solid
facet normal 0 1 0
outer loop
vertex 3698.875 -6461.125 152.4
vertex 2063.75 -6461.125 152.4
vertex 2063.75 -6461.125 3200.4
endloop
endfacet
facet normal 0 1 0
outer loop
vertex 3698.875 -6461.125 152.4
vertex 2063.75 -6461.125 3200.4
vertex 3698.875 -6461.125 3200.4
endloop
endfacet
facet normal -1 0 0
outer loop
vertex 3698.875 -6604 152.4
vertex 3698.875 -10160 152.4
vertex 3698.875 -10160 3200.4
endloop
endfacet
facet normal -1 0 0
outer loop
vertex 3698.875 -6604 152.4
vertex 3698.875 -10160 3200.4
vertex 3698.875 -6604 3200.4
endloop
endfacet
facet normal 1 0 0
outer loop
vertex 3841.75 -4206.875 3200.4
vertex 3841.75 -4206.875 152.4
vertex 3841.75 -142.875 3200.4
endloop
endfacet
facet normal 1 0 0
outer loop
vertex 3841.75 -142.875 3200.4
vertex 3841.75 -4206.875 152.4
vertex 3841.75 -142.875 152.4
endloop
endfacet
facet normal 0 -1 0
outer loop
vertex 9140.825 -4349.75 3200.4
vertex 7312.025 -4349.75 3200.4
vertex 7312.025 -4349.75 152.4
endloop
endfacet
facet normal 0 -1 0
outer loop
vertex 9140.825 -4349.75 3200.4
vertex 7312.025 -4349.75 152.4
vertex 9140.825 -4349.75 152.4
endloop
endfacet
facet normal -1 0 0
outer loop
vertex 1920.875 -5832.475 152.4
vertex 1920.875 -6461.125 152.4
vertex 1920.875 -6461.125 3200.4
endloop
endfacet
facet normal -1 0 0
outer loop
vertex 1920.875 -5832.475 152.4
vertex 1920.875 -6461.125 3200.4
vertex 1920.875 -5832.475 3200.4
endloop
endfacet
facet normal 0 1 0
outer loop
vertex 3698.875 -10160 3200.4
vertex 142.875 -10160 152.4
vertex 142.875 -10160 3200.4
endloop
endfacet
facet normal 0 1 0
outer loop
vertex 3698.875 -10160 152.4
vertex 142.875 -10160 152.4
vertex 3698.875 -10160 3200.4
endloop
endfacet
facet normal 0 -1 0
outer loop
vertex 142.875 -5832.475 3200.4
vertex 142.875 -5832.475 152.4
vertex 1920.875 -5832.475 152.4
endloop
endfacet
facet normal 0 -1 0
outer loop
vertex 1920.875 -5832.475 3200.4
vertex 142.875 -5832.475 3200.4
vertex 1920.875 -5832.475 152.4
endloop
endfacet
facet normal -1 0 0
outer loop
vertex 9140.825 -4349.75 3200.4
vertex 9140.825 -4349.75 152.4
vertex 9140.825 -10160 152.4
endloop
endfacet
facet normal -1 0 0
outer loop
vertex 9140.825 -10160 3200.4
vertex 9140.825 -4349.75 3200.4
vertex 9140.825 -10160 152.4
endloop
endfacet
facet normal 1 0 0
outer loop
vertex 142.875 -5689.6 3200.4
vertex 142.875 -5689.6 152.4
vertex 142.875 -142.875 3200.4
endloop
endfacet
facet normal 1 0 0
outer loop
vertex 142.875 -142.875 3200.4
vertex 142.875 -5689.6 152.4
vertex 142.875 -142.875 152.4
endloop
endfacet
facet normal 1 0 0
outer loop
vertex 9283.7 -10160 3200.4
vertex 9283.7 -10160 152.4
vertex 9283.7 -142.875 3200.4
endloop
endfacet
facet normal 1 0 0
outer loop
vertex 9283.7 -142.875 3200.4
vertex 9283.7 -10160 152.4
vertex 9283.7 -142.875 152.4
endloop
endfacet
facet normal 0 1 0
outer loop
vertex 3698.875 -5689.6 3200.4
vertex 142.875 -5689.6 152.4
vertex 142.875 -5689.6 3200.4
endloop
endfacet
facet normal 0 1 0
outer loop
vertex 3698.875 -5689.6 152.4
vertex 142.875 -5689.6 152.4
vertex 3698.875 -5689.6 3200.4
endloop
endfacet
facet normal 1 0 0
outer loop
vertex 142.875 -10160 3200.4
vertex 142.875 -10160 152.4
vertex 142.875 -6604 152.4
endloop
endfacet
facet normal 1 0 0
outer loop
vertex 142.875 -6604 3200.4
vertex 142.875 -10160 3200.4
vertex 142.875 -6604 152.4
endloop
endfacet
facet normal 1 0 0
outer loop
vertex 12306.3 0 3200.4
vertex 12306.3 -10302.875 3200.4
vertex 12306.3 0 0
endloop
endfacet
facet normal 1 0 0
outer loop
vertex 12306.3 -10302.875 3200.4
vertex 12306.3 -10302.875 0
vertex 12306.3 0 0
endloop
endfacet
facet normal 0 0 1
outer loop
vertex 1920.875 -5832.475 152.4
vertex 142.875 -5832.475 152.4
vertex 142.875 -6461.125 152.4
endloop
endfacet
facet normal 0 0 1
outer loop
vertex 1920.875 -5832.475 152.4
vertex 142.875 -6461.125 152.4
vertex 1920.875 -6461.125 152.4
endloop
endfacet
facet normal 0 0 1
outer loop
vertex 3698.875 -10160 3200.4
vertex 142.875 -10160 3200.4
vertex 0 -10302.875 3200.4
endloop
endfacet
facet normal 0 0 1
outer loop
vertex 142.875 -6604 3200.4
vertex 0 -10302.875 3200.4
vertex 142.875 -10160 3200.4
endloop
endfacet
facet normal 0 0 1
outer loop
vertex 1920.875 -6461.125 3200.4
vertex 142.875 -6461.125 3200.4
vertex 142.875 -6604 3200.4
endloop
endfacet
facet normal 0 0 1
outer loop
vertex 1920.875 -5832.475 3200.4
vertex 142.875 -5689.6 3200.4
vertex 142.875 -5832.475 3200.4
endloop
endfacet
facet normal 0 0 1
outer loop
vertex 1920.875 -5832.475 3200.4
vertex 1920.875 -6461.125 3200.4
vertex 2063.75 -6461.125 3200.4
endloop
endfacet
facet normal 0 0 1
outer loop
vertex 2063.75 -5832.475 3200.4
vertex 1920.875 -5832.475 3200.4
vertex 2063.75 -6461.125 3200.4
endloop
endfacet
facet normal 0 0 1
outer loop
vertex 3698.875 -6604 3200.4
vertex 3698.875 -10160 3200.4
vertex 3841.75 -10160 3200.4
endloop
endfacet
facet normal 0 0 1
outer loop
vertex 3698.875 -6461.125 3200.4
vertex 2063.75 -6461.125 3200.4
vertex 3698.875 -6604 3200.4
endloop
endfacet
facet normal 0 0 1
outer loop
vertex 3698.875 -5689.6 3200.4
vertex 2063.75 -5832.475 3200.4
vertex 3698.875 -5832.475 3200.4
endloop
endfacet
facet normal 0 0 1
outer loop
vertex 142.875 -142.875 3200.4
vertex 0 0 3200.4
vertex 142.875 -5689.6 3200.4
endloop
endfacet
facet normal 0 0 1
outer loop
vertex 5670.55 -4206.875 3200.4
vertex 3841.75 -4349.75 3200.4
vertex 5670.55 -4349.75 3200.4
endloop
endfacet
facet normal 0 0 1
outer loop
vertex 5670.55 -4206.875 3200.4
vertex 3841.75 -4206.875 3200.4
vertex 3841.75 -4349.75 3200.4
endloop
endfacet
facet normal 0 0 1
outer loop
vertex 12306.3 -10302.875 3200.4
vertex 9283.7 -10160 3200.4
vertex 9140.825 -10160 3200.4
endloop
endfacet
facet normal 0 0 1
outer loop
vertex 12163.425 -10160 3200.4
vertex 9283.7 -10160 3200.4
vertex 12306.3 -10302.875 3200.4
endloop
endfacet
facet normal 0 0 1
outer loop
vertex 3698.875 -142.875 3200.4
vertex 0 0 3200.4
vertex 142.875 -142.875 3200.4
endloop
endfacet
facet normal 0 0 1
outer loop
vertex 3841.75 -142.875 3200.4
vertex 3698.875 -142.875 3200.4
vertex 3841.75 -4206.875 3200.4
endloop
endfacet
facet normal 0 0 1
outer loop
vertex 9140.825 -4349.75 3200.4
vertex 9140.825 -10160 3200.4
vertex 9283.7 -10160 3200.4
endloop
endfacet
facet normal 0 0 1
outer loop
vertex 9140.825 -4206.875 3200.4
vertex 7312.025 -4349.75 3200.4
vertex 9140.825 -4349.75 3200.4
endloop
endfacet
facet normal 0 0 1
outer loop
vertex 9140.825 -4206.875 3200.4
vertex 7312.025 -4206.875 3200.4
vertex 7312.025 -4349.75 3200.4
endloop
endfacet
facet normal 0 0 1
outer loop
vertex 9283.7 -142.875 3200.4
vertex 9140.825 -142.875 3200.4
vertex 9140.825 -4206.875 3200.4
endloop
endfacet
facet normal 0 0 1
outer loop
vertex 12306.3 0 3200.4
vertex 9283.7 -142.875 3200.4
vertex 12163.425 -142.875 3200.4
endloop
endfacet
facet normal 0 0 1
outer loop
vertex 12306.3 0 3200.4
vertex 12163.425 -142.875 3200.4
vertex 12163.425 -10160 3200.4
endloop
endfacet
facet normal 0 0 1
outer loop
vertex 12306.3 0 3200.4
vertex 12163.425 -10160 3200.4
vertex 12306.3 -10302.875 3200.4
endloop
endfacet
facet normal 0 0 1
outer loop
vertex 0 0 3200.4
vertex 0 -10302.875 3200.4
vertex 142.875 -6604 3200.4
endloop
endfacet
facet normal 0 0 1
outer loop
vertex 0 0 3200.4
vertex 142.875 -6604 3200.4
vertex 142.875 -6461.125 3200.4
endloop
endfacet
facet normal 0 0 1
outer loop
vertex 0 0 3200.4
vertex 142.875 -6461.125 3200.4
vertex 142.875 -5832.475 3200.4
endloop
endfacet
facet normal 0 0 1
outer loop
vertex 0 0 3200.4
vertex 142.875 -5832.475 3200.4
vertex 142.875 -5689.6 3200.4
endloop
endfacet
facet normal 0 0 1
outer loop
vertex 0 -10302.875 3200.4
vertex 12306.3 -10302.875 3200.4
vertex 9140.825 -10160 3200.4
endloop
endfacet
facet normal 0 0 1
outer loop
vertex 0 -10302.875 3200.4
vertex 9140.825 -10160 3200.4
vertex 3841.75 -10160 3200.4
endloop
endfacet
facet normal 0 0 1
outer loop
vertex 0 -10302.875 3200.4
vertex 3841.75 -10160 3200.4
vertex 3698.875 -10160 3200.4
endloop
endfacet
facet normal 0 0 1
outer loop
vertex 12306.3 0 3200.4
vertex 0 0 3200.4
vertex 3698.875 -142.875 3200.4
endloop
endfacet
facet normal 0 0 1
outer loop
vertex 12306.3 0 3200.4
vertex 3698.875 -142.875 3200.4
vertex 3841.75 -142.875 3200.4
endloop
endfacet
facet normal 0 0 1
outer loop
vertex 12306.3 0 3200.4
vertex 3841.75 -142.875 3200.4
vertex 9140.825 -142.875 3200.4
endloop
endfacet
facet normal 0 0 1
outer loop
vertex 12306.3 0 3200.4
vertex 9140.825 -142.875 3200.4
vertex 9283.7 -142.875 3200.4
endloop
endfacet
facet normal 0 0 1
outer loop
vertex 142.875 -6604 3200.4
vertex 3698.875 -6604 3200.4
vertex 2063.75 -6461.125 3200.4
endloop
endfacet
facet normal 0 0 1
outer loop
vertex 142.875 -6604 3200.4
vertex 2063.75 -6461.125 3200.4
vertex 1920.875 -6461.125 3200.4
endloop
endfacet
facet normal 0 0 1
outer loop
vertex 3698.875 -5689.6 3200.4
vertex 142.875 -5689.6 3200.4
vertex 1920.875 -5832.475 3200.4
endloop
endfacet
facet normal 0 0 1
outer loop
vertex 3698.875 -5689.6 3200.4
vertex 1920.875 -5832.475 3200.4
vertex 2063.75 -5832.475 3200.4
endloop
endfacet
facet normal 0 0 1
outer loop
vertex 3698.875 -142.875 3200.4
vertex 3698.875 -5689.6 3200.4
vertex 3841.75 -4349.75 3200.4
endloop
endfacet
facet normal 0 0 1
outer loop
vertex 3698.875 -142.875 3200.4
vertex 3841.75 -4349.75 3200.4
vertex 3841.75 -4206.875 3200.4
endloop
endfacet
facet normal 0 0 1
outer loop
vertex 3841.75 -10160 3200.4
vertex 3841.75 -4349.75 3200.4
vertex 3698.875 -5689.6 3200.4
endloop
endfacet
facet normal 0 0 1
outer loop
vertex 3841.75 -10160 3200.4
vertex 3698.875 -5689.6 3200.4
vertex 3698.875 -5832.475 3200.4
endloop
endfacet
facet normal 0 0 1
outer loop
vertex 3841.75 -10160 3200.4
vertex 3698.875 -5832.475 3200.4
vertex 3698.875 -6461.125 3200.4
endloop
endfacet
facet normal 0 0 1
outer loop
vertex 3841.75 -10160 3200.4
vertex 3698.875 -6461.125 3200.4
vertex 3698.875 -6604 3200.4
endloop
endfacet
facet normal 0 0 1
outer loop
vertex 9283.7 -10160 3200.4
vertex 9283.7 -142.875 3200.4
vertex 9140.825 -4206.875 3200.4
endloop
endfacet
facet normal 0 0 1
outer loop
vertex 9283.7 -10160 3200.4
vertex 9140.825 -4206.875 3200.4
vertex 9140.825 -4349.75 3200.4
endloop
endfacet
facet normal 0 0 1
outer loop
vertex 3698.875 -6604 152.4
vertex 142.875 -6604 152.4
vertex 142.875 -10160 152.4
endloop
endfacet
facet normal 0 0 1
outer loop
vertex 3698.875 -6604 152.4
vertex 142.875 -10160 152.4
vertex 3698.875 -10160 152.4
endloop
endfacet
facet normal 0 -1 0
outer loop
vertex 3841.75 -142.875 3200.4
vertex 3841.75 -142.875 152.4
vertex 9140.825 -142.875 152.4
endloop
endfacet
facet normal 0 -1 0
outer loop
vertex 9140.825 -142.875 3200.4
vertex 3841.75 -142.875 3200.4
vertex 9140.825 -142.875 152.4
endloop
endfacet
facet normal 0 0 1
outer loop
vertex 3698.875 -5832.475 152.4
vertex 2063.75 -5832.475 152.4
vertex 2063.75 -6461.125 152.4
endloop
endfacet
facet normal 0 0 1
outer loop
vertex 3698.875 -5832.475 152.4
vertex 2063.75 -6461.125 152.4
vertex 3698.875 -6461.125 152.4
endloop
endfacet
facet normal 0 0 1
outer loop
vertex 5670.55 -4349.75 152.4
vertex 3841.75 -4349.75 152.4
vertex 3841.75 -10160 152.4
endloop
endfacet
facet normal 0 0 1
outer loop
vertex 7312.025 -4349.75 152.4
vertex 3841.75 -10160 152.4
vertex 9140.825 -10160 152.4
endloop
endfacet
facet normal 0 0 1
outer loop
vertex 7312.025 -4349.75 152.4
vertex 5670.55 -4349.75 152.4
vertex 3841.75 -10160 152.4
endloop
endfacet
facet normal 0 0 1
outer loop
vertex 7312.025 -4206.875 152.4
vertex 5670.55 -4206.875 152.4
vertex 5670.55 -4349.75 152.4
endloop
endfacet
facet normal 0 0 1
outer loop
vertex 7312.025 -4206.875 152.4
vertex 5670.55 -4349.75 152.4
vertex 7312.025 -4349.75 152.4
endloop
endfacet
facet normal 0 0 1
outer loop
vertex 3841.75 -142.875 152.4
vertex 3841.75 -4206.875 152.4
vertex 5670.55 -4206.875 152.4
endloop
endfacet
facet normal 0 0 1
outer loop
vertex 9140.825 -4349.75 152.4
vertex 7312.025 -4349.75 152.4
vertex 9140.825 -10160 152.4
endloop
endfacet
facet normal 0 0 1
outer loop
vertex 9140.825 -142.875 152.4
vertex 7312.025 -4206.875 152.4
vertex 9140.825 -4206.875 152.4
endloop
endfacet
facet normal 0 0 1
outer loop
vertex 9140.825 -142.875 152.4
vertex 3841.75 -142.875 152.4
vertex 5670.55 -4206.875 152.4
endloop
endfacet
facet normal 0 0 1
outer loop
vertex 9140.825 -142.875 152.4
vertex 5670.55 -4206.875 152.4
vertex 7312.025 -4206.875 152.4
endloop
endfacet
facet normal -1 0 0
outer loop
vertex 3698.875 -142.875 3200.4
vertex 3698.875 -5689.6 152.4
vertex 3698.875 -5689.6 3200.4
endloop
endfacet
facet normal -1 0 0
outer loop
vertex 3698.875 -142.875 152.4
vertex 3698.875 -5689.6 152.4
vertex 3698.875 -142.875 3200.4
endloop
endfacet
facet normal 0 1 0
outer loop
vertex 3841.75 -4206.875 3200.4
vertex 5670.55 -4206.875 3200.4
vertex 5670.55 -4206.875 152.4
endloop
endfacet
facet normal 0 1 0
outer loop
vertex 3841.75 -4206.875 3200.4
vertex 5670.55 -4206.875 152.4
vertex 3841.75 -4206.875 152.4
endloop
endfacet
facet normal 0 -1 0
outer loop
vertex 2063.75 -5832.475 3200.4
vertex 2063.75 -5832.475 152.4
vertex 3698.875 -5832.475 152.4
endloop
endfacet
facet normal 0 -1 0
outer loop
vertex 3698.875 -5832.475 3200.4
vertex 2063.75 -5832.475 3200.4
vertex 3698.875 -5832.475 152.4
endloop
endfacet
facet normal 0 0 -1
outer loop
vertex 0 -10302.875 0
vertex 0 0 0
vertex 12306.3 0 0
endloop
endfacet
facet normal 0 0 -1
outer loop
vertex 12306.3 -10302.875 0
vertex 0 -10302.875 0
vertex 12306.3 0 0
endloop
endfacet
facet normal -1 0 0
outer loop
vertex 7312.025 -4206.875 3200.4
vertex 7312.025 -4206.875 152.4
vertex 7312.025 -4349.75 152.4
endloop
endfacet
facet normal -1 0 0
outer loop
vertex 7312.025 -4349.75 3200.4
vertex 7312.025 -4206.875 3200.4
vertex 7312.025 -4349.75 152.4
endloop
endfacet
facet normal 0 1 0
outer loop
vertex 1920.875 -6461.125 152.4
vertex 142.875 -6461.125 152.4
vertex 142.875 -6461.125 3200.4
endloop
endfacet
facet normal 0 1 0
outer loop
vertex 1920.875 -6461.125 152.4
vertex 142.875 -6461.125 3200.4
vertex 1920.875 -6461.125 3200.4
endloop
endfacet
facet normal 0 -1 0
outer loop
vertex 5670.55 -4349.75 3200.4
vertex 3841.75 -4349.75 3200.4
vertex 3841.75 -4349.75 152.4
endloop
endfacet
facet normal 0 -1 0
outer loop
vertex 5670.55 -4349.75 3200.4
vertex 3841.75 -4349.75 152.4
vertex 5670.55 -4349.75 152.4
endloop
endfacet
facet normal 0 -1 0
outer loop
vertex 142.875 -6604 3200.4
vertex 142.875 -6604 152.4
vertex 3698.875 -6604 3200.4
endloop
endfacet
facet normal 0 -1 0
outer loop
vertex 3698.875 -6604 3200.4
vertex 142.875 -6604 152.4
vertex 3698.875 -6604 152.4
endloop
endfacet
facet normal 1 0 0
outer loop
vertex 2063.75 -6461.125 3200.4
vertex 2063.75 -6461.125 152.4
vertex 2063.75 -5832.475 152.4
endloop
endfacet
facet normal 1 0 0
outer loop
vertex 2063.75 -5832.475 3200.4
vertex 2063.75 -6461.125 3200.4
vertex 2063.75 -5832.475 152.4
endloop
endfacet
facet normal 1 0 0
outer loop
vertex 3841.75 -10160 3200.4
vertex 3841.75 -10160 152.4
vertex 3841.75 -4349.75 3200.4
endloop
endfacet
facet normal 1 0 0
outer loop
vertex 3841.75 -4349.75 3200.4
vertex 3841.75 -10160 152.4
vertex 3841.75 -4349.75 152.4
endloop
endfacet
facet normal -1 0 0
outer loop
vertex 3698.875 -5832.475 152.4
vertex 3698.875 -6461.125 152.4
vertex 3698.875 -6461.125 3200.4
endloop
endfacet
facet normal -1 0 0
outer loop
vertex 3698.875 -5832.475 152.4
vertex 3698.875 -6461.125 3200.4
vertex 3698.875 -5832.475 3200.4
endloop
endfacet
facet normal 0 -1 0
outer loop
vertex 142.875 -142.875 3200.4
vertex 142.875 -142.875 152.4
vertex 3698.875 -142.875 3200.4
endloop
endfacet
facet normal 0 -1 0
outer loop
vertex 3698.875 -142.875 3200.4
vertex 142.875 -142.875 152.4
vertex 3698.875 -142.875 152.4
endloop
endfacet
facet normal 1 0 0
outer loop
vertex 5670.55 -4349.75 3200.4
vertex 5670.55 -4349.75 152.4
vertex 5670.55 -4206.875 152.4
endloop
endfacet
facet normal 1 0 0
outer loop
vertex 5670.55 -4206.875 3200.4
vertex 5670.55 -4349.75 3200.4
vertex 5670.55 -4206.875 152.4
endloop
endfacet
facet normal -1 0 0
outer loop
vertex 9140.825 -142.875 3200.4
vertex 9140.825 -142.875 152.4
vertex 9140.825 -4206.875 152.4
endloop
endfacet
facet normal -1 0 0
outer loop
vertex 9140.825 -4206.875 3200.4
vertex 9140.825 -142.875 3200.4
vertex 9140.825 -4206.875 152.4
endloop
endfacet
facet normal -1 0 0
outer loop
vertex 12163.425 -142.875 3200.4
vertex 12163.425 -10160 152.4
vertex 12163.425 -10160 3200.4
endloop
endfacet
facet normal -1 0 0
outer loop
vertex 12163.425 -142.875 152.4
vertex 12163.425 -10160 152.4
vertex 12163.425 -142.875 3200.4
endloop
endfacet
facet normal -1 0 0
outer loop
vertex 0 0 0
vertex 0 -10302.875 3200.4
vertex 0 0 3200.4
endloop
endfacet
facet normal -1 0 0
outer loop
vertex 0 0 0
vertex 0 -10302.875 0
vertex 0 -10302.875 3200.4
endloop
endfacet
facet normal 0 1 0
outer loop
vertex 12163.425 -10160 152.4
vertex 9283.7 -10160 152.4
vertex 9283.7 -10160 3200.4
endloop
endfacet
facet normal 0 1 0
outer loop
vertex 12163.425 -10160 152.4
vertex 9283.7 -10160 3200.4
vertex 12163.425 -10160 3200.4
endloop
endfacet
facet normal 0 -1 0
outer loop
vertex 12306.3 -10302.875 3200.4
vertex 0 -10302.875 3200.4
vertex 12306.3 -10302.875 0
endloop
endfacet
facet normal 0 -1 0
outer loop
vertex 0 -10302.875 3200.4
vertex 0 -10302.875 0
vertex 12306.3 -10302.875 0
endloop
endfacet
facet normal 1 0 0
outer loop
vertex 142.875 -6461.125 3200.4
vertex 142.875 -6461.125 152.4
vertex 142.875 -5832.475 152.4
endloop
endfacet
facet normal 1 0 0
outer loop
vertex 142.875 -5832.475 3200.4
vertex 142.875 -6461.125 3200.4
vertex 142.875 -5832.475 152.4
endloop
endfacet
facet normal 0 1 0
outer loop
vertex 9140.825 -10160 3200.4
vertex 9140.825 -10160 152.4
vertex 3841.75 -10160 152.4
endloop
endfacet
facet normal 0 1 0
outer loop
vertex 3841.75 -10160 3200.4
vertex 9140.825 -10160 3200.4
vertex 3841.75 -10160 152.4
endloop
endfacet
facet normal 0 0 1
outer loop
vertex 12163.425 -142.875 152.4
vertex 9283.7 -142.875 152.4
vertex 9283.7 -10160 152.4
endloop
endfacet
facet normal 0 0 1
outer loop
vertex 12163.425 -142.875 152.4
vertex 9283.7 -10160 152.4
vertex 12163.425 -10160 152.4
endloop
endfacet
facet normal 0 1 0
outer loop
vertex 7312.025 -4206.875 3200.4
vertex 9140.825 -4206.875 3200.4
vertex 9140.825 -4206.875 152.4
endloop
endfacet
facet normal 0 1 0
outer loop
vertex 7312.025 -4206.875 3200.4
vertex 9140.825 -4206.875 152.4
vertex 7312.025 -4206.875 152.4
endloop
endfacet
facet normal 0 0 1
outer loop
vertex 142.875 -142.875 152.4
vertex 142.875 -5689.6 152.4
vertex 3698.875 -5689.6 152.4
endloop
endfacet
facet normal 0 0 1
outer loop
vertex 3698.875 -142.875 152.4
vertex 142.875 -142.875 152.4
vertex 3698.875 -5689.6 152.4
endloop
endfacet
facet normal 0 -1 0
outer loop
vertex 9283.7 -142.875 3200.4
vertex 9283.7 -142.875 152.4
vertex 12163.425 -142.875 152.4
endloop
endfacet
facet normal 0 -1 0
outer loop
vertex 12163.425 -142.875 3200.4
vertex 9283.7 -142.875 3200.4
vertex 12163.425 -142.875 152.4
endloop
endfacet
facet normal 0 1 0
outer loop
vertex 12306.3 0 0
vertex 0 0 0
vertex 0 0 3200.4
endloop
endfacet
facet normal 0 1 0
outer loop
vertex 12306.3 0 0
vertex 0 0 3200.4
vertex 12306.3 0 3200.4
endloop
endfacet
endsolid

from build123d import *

# Parameters (mm, degrees)
F0_W     = 12306.3
F0_H     = 10302.875
F1_DEPTH = 152.4
F2_W     = 12306.3
F2_H     = 10302.875
F2_W_2   = 3556
F2_H_2   = 3556
F2_W_3   = 1778
F2_H_3   = 628.65
F2_W_4   = 1635.125
F2_H_4   = 5546.725
F2_W_5   = 2879.725
F2_H_5   = 10017.125
F3_DEPTH = 3048


with BuildPart() as f1:
    # F0 (on Top) → F1 (new body)
    with BuildSketch(Plane.XY):
        with Locations((6153.15, -5151.4375)):
            Rectangle(F0_W, F0_H)
    extrude(amount=F1_DEPTH)

    # F2 (on face) → F3 (join)
    with BuildSketch(Plane.XY.offset(152.4)):
        with Locations((6153.15, -5151.4375)):
            Rectangle(F2_W, F2_H)
        with Locations((1920.875, -8382)):
            Rectangle(F2_W_2, F2_H_2, mode=Mode.SUBTRACT)
        with Locations((1031.875, -6146.8)):
            Rectangle(F2_W_3, F2_H_3, mode=Mode.SUBTRACT)
        with Locations((2881.3125, -6146.8)):
            Rectangle(F2_W_4, F2_H_3, mode=Mode.SUBTRACT)
        with Locations((1920.875, -2916.2375)):
            Rectangle(F2_W_2, F2_H_4, mode=Mode.SUBTRACT)
        Polygon((9140.825, -4349.75), (9140.825, -10160), (3841.75, -10160), (3841.75, -4349.75), (5670.55, -4349.75), (5670.55, -4206.875), (3841.75, -4206.875), (3841.75, -142.875), (9140.825, -142.875), (9140.825, -4206.875), (7312.025, -4206.875), (7312.025, -4349.75), align=None, mode=Mode.SUBTRACT)
        with Locations((10723.5625, -5151.4375)):
            Rectangle(F2_W_5, F2_H_5, mode=Mode.SUBTRACT)
    extrude(amount=F3_DEPTH)


solid = f1.part
